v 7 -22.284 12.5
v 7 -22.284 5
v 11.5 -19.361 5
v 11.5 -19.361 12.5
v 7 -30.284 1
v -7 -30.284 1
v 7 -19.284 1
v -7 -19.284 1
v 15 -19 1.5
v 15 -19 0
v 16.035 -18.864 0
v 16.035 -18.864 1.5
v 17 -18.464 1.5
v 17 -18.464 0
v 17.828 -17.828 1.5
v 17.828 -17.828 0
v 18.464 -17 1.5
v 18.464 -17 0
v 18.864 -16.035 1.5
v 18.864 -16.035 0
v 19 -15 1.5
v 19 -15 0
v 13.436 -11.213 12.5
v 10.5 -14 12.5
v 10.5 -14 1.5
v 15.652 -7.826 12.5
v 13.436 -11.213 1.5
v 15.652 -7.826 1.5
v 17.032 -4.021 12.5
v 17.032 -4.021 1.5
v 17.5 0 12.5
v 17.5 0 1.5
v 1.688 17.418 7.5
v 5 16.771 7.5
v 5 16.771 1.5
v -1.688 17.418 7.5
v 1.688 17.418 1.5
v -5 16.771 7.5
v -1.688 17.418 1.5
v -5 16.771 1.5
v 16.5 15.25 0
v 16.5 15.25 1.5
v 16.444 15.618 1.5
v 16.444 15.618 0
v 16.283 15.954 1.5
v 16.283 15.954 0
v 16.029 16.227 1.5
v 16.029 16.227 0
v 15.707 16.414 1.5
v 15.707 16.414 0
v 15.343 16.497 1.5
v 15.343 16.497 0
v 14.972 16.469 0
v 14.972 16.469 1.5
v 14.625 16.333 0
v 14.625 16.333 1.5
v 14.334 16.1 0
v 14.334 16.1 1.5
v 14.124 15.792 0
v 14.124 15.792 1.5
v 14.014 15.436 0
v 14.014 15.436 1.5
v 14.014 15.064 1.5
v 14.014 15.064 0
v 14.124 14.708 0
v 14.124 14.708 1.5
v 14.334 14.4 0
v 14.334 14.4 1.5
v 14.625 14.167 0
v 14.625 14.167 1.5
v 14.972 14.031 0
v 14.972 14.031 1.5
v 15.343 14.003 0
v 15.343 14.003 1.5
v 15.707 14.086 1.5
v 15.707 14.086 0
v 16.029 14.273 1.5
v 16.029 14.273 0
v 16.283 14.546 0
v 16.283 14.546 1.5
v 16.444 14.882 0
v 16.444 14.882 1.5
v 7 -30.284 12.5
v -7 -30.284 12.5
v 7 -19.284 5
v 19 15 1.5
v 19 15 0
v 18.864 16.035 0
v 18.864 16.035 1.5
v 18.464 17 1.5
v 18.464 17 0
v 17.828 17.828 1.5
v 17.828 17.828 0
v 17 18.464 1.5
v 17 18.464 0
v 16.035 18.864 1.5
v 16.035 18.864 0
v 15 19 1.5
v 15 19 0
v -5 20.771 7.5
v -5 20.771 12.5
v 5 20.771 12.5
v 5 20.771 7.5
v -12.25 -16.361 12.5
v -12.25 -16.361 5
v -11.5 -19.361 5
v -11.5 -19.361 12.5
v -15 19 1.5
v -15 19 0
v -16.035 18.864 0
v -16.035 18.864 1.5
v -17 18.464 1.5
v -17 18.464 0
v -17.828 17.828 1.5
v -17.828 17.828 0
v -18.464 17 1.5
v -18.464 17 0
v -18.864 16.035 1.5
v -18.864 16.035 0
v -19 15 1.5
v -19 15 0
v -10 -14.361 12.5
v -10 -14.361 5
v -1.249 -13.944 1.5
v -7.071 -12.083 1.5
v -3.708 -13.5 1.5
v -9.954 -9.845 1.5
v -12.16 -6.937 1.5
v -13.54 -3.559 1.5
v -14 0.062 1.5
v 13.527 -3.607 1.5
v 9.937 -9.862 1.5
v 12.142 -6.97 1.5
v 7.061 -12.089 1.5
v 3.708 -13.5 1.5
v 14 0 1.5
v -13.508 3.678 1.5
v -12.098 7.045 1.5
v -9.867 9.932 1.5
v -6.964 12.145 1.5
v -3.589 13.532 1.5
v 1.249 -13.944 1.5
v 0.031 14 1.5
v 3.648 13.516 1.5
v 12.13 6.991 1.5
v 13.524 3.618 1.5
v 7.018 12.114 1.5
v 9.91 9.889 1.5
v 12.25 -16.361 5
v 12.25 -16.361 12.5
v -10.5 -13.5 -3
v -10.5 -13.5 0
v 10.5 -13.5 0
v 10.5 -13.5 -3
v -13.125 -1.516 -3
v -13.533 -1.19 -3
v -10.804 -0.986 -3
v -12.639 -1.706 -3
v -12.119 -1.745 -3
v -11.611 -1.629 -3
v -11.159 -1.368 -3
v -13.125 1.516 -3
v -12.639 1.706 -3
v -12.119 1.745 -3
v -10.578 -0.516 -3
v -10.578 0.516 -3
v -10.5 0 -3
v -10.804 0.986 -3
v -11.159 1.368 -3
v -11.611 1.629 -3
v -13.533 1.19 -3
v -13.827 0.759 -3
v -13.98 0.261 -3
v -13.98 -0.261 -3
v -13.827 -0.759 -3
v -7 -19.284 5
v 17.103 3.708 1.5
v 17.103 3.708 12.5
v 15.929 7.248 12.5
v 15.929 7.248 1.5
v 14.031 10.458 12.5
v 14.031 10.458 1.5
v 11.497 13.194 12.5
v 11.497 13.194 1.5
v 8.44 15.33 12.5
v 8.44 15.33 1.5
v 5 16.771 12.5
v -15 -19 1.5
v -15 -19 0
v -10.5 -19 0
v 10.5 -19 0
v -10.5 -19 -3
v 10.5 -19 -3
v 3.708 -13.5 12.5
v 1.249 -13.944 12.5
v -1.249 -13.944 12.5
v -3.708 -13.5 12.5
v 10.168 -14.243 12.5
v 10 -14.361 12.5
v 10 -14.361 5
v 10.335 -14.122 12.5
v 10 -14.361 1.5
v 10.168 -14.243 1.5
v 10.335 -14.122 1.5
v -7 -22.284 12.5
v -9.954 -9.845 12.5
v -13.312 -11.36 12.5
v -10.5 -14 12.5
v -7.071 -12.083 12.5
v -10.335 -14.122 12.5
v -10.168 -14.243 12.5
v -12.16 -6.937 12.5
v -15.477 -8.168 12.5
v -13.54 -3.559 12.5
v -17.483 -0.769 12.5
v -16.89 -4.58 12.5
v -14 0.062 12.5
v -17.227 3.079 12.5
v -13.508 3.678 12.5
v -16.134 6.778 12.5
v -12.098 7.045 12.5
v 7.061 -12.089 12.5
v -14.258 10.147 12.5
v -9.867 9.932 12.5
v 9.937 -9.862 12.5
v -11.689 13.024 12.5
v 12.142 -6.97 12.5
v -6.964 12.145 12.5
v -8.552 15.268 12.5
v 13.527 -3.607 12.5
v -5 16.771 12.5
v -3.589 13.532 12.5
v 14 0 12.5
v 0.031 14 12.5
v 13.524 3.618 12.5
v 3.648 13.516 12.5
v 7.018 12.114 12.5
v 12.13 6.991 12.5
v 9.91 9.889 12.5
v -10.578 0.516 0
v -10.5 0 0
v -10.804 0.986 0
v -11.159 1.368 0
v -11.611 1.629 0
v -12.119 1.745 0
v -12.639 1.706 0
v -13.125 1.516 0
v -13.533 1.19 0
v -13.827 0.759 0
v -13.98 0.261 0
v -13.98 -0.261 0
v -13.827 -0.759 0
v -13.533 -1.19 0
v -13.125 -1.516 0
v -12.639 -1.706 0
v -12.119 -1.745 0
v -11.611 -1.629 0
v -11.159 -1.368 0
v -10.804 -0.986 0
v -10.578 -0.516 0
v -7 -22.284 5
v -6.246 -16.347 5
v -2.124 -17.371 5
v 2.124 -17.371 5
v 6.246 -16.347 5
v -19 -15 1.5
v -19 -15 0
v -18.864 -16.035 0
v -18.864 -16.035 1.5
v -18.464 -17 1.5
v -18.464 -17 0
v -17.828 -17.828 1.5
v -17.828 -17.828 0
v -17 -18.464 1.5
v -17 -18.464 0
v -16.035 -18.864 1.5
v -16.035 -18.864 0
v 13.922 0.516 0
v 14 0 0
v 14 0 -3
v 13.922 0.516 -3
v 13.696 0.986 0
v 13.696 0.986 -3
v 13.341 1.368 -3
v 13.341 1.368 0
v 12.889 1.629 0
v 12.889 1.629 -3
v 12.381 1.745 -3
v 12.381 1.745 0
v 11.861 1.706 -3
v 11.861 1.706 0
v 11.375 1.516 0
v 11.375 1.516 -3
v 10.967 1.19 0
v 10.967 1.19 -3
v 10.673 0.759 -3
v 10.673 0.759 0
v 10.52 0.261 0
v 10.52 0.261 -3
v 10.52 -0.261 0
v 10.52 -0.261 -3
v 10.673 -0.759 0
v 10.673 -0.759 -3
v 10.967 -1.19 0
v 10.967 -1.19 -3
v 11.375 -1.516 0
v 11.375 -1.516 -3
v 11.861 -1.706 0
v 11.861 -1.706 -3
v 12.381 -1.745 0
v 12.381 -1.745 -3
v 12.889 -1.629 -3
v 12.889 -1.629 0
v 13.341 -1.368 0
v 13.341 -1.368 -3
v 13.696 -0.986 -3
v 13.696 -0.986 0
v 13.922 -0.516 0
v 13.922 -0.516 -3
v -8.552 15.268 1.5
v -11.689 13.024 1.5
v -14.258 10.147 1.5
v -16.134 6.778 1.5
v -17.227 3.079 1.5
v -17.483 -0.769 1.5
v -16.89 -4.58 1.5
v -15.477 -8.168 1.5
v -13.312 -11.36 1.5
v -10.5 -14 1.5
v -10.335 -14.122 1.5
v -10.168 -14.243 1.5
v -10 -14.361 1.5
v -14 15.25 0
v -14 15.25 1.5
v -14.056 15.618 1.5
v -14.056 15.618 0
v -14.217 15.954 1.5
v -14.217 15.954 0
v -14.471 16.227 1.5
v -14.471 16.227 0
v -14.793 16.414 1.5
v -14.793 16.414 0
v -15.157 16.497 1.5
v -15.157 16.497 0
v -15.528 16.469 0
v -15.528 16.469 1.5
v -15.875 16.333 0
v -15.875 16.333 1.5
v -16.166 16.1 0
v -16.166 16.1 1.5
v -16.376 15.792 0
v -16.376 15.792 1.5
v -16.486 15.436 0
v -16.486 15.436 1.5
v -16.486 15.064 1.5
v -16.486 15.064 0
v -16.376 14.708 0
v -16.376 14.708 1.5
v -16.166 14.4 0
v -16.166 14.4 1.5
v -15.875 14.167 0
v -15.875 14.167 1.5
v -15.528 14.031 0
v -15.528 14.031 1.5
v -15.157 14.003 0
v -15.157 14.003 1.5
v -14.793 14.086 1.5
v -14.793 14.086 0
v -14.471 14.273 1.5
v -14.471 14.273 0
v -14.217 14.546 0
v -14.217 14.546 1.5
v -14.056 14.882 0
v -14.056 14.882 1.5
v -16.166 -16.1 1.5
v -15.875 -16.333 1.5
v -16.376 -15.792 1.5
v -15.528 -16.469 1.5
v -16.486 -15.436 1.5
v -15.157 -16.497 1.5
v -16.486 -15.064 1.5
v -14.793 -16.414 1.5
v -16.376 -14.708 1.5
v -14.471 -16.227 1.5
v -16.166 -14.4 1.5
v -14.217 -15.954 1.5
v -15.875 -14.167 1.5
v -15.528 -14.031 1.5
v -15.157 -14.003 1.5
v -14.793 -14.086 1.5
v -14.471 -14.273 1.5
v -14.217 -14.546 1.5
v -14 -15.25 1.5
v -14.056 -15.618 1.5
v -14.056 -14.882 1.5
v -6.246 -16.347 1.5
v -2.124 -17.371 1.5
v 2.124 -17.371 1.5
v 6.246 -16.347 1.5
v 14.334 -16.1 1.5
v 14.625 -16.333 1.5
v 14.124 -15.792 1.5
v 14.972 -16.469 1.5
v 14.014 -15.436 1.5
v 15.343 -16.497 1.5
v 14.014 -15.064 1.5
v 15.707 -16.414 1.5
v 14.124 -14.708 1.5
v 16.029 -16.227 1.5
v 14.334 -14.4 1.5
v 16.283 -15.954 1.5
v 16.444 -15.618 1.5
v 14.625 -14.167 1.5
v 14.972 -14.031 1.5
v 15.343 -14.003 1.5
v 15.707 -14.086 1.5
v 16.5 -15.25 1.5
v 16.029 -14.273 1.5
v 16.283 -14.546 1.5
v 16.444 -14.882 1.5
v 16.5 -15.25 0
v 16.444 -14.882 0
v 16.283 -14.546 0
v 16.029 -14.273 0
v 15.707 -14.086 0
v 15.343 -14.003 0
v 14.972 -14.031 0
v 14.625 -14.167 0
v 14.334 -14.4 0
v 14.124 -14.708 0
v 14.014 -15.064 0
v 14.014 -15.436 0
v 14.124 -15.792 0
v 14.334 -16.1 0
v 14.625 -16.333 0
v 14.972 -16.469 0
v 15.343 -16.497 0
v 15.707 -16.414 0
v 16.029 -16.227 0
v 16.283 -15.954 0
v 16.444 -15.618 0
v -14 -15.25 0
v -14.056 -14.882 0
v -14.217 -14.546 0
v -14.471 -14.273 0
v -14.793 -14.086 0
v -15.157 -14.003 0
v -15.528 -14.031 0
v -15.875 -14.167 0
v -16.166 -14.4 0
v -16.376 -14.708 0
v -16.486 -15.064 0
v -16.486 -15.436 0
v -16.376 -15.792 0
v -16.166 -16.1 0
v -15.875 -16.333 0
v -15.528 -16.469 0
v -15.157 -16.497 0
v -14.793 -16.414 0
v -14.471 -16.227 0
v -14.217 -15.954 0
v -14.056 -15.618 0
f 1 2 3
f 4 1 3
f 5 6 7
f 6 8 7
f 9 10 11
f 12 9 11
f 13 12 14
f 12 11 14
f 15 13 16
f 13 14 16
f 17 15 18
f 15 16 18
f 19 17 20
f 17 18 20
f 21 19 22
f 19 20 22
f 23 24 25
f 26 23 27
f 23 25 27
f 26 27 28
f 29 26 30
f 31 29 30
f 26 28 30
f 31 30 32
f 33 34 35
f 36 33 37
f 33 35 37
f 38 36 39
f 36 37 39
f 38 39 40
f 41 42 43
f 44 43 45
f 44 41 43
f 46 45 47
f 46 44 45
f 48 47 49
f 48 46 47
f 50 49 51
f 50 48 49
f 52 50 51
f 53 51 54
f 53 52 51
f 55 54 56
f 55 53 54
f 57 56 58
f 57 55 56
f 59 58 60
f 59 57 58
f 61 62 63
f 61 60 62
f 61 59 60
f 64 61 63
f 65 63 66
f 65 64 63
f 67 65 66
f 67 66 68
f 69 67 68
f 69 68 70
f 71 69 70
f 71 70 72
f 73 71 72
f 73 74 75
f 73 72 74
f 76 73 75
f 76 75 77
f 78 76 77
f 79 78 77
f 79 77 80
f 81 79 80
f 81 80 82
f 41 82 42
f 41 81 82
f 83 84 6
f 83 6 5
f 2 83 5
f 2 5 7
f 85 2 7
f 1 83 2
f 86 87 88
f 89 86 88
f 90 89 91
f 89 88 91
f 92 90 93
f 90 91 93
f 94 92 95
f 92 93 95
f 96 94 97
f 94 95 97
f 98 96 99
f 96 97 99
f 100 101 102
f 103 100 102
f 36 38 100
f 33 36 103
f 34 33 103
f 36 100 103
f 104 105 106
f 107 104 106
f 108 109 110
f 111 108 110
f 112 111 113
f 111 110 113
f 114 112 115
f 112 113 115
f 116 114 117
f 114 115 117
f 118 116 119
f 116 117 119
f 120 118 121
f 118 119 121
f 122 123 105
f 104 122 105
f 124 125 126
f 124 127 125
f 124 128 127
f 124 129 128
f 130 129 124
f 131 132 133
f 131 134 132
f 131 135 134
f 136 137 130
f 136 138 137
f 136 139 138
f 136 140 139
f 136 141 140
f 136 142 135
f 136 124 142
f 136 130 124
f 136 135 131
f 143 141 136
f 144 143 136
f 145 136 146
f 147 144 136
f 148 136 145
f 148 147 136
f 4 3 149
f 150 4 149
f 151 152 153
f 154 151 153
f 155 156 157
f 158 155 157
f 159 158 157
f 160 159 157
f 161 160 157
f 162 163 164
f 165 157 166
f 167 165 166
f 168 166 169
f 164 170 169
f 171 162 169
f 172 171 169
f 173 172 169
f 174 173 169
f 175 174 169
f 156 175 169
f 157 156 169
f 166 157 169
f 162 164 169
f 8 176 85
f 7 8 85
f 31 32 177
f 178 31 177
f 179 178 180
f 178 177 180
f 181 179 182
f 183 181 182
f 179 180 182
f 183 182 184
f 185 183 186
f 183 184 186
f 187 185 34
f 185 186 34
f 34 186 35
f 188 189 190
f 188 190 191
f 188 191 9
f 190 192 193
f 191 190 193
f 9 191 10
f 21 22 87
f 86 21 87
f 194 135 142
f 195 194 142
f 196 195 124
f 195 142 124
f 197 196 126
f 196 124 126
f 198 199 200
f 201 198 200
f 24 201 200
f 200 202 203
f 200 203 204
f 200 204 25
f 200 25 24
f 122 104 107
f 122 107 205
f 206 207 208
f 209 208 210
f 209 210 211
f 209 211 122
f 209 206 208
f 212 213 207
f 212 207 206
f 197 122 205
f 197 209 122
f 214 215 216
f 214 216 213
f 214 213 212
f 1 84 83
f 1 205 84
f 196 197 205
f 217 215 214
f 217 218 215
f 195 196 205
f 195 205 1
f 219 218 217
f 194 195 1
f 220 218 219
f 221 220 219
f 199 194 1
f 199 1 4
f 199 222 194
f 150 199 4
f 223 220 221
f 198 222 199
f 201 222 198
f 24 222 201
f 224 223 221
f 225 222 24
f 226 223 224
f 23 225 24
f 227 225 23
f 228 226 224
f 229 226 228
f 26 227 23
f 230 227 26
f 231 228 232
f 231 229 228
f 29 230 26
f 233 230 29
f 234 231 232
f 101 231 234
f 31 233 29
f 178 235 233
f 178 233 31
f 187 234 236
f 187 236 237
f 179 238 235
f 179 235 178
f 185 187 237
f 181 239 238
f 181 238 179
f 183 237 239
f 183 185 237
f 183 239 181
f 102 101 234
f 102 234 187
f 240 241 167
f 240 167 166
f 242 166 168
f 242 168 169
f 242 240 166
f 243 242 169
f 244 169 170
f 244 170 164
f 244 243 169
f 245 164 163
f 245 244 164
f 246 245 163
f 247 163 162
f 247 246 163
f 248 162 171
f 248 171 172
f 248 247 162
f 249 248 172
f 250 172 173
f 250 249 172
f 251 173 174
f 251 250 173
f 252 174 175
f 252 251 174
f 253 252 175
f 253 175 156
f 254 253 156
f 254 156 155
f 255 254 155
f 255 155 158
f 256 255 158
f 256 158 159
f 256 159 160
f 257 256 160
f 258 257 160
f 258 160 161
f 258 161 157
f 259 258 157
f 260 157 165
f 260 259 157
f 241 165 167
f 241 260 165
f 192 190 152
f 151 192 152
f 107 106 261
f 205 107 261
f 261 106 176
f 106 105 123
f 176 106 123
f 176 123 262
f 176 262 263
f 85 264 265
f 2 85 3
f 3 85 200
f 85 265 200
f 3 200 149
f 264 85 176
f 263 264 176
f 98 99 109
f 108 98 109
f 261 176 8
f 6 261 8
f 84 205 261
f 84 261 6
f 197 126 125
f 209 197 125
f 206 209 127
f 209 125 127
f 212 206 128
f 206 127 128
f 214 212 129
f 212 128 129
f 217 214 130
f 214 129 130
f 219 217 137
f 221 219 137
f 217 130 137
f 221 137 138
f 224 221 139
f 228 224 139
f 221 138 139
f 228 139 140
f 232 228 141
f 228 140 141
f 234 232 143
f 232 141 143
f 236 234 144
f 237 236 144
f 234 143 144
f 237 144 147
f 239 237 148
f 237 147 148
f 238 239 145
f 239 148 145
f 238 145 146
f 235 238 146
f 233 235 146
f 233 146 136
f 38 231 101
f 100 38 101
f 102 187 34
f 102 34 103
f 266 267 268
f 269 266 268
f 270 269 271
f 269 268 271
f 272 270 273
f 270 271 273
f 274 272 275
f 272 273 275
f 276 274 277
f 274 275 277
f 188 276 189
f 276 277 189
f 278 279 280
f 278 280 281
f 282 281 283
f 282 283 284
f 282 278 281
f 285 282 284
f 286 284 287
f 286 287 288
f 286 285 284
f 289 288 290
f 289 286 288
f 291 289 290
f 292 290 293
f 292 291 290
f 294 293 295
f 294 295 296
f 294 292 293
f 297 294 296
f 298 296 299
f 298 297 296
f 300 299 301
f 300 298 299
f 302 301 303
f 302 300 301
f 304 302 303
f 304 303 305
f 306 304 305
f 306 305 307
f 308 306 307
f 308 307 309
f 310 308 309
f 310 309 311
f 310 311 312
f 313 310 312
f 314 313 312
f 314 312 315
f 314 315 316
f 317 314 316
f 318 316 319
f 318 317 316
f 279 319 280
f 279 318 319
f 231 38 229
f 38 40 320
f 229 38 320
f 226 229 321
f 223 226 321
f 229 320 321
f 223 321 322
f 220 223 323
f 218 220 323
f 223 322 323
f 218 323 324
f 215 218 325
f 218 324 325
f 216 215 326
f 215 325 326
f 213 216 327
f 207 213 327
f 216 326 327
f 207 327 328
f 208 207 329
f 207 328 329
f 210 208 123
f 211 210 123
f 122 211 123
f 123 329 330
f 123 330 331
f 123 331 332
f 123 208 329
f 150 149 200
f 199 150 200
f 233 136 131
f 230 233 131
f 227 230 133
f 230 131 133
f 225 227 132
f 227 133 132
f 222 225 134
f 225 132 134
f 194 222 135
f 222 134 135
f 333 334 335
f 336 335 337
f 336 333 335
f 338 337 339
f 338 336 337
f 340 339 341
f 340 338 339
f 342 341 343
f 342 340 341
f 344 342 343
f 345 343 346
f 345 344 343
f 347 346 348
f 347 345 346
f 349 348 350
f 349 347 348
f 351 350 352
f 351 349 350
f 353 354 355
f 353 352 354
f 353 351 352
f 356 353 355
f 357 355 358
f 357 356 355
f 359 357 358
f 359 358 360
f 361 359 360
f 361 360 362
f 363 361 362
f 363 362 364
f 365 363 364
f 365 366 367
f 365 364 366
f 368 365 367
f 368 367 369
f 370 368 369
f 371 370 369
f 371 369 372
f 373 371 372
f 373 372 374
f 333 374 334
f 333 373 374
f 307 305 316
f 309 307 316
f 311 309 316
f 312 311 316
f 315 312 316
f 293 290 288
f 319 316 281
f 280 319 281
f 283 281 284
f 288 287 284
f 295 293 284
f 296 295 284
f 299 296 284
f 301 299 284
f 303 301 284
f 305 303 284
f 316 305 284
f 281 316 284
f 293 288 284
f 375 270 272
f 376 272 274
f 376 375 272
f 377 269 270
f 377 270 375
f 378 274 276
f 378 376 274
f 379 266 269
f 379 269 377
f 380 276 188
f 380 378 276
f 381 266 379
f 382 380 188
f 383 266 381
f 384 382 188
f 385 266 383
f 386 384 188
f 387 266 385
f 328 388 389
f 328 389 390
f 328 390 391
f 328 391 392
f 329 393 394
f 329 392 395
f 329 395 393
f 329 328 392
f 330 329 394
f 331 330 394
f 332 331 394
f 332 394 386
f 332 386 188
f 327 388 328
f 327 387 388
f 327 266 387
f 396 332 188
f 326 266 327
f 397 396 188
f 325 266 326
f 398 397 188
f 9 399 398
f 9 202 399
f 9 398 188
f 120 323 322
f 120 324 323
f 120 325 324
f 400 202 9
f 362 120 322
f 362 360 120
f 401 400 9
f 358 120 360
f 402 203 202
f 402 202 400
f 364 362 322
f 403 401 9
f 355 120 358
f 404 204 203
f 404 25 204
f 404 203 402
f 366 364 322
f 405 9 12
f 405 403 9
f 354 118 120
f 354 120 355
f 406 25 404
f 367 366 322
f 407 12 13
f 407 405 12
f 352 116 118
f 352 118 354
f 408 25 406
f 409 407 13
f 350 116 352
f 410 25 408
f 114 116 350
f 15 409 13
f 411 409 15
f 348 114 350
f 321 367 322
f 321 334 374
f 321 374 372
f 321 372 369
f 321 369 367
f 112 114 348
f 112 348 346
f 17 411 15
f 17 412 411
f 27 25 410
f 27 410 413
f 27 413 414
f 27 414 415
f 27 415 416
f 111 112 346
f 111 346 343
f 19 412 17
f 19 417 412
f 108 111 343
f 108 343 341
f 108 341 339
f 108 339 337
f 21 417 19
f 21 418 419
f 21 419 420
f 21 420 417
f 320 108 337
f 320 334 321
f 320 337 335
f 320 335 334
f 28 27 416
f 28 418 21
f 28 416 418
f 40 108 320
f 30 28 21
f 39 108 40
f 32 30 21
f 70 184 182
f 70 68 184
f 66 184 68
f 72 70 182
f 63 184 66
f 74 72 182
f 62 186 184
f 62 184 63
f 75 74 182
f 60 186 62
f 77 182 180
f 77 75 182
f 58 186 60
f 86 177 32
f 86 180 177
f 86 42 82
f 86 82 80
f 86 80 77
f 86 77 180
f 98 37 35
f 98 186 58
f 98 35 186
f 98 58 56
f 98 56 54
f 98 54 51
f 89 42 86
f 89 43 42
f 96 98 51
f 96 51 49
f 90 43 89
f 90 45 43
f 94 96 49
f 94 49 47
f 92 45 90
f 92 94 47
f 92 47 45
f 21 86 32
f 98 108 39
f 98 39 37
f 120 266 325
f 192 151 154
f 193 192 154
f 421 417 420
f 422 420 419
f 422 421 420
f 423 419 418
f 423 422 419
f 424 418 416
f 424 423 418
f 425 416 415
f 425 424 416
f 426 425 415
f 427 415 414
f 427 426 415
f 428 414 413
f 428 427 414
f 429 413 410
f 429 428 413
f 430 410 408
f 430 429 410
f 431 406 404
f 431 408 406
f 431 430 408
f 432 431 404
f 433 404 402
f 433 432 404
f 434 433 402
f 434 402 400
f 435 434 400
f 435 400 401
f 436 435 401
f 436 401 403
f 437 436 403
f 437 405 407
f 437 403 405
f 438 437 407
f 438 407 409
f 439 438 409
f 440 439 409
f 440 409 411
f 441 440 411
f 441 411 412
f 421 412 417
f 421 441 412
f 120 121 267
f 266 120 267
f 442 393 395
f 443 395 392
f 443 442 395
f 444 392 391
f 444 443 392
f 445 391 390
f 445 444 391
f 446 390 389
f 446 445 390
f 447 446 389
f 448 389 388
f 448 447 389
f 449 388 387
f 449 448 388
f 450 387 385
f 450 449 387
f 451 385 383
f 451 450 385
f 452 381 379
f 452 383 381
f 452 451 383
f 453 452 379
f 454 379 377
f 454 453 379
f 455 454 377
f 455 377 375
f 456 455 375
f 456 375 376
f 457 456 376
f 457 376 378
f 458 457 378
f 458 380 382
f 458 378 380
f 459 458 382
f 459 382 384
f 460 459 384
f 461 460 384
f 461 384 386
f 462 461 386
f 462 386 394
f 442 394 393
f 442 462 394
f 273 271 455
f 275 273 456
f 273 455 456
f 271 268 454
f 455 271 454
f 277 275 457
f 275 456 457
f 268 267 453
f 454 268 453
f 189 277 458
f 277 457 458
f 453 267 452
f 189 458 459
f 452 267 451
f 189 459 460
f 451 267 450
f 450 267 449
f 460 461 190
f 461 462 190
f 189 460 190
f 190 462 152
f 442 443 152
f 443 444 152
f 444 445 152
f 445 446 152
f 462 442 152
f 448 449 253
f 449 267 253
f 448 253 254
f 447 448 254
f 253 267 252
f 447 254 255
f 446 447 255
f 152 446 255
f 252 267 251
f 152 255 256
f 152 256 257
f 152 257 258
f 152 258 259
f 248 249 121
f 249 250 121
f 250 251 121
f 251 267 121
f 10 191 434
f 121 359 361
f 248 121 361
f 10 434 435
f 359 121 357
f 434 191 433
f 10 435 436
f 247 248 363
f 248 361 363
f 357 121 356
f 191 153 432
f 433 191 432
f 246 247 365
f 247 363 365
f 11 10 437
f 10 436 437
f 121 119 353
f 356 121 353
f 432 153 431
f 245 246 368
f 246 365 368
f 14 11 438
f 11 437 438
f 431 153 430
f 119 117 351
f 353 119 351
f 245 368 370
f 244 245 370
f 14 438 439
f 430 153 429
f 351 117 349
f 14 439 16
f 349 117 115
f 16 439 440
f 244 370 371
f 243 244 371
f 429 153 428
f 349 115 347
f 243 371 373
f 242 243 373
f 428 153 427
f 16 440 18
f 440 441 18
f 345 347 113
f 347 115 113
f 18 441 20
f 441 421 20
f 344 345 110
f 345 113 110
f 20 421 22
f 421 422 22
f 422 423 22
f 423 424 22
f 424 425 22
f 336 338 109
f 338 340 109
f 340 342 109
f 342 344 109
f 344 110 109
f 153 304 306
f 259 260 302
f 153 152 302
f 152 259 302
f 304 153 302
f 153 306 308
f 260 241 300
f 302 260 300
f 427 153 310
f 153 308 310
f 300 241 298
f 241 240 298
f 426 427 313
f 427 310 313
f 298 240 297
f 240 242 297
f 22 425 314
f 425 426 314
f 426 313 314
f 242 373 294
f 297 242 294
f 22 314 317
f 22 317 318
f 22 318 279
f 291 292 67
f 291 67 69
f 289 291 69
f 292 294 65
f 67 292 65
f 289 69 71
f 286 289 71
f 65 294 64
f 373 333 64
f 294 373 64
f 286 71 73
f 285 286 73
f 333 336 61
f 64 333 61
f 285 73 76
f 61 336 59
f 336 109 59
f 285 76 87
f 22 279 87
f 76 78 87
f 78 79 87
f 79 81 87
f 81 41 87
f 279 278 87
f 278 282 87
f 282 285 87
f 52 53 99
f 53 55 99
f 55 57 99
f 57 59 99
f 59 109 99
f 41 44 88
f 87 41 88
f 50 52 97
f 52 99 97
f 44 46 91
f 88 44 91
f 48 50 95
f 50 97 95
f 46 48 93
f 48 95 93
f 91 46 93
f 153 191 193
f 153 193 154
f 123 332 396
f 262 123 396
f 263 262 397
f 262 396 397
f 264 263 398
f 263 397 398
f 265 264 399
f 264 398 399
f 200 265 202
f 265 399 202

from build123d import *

# Parameters (mm, degrees)
PRINT_2_DEPTH        = 1.5
PRINT_HOLES_REACH    = 28.912
SKETCH1_4_R          = 1.25
SKETCH1_5_R          = 1.75
SCREWS_DEPTH         = 3
SKETCH1_6_W          = 21
SKETCH1_6_H          = 5.5
CABLECONNECTOR_DEPTH = 3
CAM_START            = 1.5
CAM_BASE_DEPTH       = 11
BASE_START           = 12.5
SKETCH1_8_W          = 10
SKETCH1_8_H          = 4
BASE_CLAMP_DEPTH     = 5
BOSS_EXTRUDE6_START  = 5
BOSS_EXTRUDE6_DEPTH  = 7.5
BOSS_EXTRUDE7_START  = 12.5
SKETCH1_10_W         = 14
SKETCH1_10_H         = 8
SKETCH1_10_H_2       = 3
BOSS_EXTRUDE7_DEPTH  = 11.5


with BuildPart() as part:
    # Sketch1 → print 2 (new body)
    with BuildSketch(Plane.XY):
        with BuildLine():
            Line((-15, -19), (15, -19))
            ThreePointArc((15, -19), (17.828427125, -17.828427125), (19, -15))
            Line((19, -15), (19, 15))
            ThreePointArc((19, 15), (17.828427125, 17.828427125), (15, 19))
            Line((15, 19), (-15, 19))
            ThreePointArc((-15, 19), (-17.828427125, 17.828427125), (-19, 15))
            Line((-19, 15), (-19, -15))
            ThreePointArc((-19, -15), (-17.828427125, -17.828427125), (-15, -19))
        make_face()
    extrude(amount=PRINT_2_DEPTH)

    # Sketch1<4> → print_holes (cut, up to next)
    with BuildSketch(Plane.XY, mode=Mode.PRIVATE) as print_holes_sk1:
        with Locations((-15.25, 15.25)):
            Circle(SKETCH1_4_R)
    print_holes_tool1 = extrude(print_holes_sk1.sketch, amount=PRINT_HOLES_REACH, mode=Mode.PRIVATE) & part.part
    # Sketch1<4> → print_holes (cut, up to next)
    with BuildSketch(Plane.XY, mode=Mode.PRIVATE) as print_holes_sk2:
        with Locations((-15.25, -15.25)):
            Circle(SKETCH1_4_R)
    print_holes_tool2 = extrude(print_holes_sk2.sketch, amount=PRINT_HOLES_REACH, mode=Mode.PRIVATE) & part.part
    # Sketch1<4> → print_holes (cut, up to next)
    with BuildSketch(Plane.XY, mode=Mode.PRIVATE) as print_holes_sk3:
        with Locations((15.25, -15.25)):
            Circle(SKETCH1_4_R)
    print_holes_tool3 = extrude(print_holes_sk3.sketch, amount=PRINT_HOLES_REACH, mode=Mode.PRIVATE) & part.part
    # Sketch1<4> → print_holes (cut, up to next)
    with BuildSketch(Plane.XY, mode=Mode.PRIVATE) as print_holes_sk4:
        with Locations((15.25, 15.25)):
            Circle(SKETCH1_4_R)
    print_holes_tool4 = extrude(print_holes_sk4.sketch, amount=PRINT_HOLES_REACH, mode=Mode.PRIVATE) & part.part
    add(print_holes_tool1.solids().sort_by_distance((-15.25, 15.25, 0))[0], mode=Mode.SUBTRACT)
    add(print_holes_tool2.solids().sort_by_distance((-15.25, -15.25, 0))[0], mode=Mode.SUBTRACT)
    add(print_holes_tool3.solids().sort_by_distance((15.25, -15.25, 0))[0], mode=Mode.SUBTRACT)
    add(print_holes_tool4.solids().sort_by_distance((15.25, 15.25, 0))[0], mode=Mode.SUBTRACT)

    # Sketch1<5> → screws (add)
    with BuildSketch(Plane.XY):
        with Locations((-12.25, 0)):
            Circle(SKETCH1_5_R)
        with Locations((12.25, 0)):
            Circle(SKETCH1_5_R)
    extrude(amount=-SCREWS_DEPTH)

    # Sketch1<6> → cableconnector (add)
    with BuildSketch(Plane.XY):
        with Locations((0, -16.25)):
            Rectangle(SKETCH1_6_W, SKETCH1_6_H)
    extrude(amount=-CABLECONNECTOR_DEPTH)

    # Sketch1<7> → cam base (add)
    with BuildSketch(Plane.XY.offset(CAM_START)):
        with BuildLine():
            ThreePointArc((-5, 16.770509831), (-17.226972131, 3.079193268), (-10.5, -14))
            Line((-10.5, -14), (-10.5, -13.5))
            Line((-10.5, -13.5), (-3.708099244, -13.5))
            ThreePointArc((-3.708099244, -13.5), (-11.133584092, -8.487832778), (-14, 5e-09))
            ThreePointArc((-14, 5e-09), (2e-09, 14), (14, 0))
            ThreePointArc((14, 0), (11.133584091, -8.48783278), (3.708099244, -13.5))
            Line((3.708099244, -13.5), (10.5, -13.5))
            Line((10.5, -13.5), (10.5, -14))
            ThreePointArc((10.5, -14), (15.652475842, -7.826237921), (17.5, 0))
            ThreePointArc((17.5, 0), (14.0312152, 10.458250332), (5, 16.770509831))
            Line((5, 16.770509831), (-5, 16.770509831))
        make_face()
        with BuildLine():
            Line((-10.5, -13.5), (-10.5, -14))
            ThreePointArc((-10.5, -14), (-10.251592739, -14.182906836), (-10, -14.361406616))
            ThreePointArc((-10, -14.361406616), (0, -17.5), (10, -14.361406616))
            ThreePointArc((10, -14.361406616), (10.251592739, -14.182906836), (10.5, -14))
            Line((10.5, -14), (10.5, -13.5))
            Line((10.5, -13.5), (3.708099244, -13.5))
            ThreePointArc((3.708099244, -13.5), (0, -14), (-3.708099244, -13.5))
            Line((-3.708099244, -13.5), (-10.5, -13.5))
        make_face()
        with BuildLine():
            ThreePointArc((5, 16.770509831), (0, 17.5), (-5, 16.770509831))
            Line((-5, 16.770509831), (5, 16.770509831))
        make_face()
    extrude(amount=CAM_BASE_DEPTH)

    # Sketch1<8> → base clamp (add)
    with BuildSketch(Plane.XY.offset(BASE_START)):
        with Locations((0, 18.770509831)):
            Rectangle(SKETCH1_8_W, SKETCH1_8_H)
    extrude(amount=-BASE_CLAMP_DEPTH)

    # Sketch1<9> → Boss-Extrude6 (add)
    with BuildSketch(Plane.XY.offset(BOSS_EXTRUDE6_START)):
        with BuildLine():
            Line((-11.5, -19.361406616), (-7, -22.283740786))
            Line((-7, -22.283740786), (-7, -19.283740786))
            Line((-7, -19.283740786), (7, -19.283740786))
            Line((7, -19.283740786), (7, -22.283740786))
            Line((7, -22.283740786), (11.5, -19.361406616))
            Line((11.5, -19.361406616), (12.25, -16.361406616))
            Line((12.25, -16.361406616), (10, -14.361406616))
            ThreePointArc((10, -14.361406616), (0, -17.5), (-10, -14.361406616))
            Line((-10, -14.361406616), (-12.25, -16.361406616))
            Line((-12.25, -16.361406616), (-11.5, -19.361406616))
        make_face()
    extrude(amount=BOSS_EXTRUDE6_DEPTH)

    # Sketch1<10> → Boss-Extrude7 (add)
    with BuildSketch(Plane.XY.offset(BOSS_EXTRUDE7_START)):
        with Locations((0, -26.283740786)):
            Rectangle(SKETCH1_10_W, SKETCH1_10_H)
        with Locations((0, -20.783740786)):
            Rectangle(SKETCH1_10_W, SKETCH1_10_H_2)
    extrude(amount=-BOSS_EXTRUDE7_DEPTH)


solid = part.part
